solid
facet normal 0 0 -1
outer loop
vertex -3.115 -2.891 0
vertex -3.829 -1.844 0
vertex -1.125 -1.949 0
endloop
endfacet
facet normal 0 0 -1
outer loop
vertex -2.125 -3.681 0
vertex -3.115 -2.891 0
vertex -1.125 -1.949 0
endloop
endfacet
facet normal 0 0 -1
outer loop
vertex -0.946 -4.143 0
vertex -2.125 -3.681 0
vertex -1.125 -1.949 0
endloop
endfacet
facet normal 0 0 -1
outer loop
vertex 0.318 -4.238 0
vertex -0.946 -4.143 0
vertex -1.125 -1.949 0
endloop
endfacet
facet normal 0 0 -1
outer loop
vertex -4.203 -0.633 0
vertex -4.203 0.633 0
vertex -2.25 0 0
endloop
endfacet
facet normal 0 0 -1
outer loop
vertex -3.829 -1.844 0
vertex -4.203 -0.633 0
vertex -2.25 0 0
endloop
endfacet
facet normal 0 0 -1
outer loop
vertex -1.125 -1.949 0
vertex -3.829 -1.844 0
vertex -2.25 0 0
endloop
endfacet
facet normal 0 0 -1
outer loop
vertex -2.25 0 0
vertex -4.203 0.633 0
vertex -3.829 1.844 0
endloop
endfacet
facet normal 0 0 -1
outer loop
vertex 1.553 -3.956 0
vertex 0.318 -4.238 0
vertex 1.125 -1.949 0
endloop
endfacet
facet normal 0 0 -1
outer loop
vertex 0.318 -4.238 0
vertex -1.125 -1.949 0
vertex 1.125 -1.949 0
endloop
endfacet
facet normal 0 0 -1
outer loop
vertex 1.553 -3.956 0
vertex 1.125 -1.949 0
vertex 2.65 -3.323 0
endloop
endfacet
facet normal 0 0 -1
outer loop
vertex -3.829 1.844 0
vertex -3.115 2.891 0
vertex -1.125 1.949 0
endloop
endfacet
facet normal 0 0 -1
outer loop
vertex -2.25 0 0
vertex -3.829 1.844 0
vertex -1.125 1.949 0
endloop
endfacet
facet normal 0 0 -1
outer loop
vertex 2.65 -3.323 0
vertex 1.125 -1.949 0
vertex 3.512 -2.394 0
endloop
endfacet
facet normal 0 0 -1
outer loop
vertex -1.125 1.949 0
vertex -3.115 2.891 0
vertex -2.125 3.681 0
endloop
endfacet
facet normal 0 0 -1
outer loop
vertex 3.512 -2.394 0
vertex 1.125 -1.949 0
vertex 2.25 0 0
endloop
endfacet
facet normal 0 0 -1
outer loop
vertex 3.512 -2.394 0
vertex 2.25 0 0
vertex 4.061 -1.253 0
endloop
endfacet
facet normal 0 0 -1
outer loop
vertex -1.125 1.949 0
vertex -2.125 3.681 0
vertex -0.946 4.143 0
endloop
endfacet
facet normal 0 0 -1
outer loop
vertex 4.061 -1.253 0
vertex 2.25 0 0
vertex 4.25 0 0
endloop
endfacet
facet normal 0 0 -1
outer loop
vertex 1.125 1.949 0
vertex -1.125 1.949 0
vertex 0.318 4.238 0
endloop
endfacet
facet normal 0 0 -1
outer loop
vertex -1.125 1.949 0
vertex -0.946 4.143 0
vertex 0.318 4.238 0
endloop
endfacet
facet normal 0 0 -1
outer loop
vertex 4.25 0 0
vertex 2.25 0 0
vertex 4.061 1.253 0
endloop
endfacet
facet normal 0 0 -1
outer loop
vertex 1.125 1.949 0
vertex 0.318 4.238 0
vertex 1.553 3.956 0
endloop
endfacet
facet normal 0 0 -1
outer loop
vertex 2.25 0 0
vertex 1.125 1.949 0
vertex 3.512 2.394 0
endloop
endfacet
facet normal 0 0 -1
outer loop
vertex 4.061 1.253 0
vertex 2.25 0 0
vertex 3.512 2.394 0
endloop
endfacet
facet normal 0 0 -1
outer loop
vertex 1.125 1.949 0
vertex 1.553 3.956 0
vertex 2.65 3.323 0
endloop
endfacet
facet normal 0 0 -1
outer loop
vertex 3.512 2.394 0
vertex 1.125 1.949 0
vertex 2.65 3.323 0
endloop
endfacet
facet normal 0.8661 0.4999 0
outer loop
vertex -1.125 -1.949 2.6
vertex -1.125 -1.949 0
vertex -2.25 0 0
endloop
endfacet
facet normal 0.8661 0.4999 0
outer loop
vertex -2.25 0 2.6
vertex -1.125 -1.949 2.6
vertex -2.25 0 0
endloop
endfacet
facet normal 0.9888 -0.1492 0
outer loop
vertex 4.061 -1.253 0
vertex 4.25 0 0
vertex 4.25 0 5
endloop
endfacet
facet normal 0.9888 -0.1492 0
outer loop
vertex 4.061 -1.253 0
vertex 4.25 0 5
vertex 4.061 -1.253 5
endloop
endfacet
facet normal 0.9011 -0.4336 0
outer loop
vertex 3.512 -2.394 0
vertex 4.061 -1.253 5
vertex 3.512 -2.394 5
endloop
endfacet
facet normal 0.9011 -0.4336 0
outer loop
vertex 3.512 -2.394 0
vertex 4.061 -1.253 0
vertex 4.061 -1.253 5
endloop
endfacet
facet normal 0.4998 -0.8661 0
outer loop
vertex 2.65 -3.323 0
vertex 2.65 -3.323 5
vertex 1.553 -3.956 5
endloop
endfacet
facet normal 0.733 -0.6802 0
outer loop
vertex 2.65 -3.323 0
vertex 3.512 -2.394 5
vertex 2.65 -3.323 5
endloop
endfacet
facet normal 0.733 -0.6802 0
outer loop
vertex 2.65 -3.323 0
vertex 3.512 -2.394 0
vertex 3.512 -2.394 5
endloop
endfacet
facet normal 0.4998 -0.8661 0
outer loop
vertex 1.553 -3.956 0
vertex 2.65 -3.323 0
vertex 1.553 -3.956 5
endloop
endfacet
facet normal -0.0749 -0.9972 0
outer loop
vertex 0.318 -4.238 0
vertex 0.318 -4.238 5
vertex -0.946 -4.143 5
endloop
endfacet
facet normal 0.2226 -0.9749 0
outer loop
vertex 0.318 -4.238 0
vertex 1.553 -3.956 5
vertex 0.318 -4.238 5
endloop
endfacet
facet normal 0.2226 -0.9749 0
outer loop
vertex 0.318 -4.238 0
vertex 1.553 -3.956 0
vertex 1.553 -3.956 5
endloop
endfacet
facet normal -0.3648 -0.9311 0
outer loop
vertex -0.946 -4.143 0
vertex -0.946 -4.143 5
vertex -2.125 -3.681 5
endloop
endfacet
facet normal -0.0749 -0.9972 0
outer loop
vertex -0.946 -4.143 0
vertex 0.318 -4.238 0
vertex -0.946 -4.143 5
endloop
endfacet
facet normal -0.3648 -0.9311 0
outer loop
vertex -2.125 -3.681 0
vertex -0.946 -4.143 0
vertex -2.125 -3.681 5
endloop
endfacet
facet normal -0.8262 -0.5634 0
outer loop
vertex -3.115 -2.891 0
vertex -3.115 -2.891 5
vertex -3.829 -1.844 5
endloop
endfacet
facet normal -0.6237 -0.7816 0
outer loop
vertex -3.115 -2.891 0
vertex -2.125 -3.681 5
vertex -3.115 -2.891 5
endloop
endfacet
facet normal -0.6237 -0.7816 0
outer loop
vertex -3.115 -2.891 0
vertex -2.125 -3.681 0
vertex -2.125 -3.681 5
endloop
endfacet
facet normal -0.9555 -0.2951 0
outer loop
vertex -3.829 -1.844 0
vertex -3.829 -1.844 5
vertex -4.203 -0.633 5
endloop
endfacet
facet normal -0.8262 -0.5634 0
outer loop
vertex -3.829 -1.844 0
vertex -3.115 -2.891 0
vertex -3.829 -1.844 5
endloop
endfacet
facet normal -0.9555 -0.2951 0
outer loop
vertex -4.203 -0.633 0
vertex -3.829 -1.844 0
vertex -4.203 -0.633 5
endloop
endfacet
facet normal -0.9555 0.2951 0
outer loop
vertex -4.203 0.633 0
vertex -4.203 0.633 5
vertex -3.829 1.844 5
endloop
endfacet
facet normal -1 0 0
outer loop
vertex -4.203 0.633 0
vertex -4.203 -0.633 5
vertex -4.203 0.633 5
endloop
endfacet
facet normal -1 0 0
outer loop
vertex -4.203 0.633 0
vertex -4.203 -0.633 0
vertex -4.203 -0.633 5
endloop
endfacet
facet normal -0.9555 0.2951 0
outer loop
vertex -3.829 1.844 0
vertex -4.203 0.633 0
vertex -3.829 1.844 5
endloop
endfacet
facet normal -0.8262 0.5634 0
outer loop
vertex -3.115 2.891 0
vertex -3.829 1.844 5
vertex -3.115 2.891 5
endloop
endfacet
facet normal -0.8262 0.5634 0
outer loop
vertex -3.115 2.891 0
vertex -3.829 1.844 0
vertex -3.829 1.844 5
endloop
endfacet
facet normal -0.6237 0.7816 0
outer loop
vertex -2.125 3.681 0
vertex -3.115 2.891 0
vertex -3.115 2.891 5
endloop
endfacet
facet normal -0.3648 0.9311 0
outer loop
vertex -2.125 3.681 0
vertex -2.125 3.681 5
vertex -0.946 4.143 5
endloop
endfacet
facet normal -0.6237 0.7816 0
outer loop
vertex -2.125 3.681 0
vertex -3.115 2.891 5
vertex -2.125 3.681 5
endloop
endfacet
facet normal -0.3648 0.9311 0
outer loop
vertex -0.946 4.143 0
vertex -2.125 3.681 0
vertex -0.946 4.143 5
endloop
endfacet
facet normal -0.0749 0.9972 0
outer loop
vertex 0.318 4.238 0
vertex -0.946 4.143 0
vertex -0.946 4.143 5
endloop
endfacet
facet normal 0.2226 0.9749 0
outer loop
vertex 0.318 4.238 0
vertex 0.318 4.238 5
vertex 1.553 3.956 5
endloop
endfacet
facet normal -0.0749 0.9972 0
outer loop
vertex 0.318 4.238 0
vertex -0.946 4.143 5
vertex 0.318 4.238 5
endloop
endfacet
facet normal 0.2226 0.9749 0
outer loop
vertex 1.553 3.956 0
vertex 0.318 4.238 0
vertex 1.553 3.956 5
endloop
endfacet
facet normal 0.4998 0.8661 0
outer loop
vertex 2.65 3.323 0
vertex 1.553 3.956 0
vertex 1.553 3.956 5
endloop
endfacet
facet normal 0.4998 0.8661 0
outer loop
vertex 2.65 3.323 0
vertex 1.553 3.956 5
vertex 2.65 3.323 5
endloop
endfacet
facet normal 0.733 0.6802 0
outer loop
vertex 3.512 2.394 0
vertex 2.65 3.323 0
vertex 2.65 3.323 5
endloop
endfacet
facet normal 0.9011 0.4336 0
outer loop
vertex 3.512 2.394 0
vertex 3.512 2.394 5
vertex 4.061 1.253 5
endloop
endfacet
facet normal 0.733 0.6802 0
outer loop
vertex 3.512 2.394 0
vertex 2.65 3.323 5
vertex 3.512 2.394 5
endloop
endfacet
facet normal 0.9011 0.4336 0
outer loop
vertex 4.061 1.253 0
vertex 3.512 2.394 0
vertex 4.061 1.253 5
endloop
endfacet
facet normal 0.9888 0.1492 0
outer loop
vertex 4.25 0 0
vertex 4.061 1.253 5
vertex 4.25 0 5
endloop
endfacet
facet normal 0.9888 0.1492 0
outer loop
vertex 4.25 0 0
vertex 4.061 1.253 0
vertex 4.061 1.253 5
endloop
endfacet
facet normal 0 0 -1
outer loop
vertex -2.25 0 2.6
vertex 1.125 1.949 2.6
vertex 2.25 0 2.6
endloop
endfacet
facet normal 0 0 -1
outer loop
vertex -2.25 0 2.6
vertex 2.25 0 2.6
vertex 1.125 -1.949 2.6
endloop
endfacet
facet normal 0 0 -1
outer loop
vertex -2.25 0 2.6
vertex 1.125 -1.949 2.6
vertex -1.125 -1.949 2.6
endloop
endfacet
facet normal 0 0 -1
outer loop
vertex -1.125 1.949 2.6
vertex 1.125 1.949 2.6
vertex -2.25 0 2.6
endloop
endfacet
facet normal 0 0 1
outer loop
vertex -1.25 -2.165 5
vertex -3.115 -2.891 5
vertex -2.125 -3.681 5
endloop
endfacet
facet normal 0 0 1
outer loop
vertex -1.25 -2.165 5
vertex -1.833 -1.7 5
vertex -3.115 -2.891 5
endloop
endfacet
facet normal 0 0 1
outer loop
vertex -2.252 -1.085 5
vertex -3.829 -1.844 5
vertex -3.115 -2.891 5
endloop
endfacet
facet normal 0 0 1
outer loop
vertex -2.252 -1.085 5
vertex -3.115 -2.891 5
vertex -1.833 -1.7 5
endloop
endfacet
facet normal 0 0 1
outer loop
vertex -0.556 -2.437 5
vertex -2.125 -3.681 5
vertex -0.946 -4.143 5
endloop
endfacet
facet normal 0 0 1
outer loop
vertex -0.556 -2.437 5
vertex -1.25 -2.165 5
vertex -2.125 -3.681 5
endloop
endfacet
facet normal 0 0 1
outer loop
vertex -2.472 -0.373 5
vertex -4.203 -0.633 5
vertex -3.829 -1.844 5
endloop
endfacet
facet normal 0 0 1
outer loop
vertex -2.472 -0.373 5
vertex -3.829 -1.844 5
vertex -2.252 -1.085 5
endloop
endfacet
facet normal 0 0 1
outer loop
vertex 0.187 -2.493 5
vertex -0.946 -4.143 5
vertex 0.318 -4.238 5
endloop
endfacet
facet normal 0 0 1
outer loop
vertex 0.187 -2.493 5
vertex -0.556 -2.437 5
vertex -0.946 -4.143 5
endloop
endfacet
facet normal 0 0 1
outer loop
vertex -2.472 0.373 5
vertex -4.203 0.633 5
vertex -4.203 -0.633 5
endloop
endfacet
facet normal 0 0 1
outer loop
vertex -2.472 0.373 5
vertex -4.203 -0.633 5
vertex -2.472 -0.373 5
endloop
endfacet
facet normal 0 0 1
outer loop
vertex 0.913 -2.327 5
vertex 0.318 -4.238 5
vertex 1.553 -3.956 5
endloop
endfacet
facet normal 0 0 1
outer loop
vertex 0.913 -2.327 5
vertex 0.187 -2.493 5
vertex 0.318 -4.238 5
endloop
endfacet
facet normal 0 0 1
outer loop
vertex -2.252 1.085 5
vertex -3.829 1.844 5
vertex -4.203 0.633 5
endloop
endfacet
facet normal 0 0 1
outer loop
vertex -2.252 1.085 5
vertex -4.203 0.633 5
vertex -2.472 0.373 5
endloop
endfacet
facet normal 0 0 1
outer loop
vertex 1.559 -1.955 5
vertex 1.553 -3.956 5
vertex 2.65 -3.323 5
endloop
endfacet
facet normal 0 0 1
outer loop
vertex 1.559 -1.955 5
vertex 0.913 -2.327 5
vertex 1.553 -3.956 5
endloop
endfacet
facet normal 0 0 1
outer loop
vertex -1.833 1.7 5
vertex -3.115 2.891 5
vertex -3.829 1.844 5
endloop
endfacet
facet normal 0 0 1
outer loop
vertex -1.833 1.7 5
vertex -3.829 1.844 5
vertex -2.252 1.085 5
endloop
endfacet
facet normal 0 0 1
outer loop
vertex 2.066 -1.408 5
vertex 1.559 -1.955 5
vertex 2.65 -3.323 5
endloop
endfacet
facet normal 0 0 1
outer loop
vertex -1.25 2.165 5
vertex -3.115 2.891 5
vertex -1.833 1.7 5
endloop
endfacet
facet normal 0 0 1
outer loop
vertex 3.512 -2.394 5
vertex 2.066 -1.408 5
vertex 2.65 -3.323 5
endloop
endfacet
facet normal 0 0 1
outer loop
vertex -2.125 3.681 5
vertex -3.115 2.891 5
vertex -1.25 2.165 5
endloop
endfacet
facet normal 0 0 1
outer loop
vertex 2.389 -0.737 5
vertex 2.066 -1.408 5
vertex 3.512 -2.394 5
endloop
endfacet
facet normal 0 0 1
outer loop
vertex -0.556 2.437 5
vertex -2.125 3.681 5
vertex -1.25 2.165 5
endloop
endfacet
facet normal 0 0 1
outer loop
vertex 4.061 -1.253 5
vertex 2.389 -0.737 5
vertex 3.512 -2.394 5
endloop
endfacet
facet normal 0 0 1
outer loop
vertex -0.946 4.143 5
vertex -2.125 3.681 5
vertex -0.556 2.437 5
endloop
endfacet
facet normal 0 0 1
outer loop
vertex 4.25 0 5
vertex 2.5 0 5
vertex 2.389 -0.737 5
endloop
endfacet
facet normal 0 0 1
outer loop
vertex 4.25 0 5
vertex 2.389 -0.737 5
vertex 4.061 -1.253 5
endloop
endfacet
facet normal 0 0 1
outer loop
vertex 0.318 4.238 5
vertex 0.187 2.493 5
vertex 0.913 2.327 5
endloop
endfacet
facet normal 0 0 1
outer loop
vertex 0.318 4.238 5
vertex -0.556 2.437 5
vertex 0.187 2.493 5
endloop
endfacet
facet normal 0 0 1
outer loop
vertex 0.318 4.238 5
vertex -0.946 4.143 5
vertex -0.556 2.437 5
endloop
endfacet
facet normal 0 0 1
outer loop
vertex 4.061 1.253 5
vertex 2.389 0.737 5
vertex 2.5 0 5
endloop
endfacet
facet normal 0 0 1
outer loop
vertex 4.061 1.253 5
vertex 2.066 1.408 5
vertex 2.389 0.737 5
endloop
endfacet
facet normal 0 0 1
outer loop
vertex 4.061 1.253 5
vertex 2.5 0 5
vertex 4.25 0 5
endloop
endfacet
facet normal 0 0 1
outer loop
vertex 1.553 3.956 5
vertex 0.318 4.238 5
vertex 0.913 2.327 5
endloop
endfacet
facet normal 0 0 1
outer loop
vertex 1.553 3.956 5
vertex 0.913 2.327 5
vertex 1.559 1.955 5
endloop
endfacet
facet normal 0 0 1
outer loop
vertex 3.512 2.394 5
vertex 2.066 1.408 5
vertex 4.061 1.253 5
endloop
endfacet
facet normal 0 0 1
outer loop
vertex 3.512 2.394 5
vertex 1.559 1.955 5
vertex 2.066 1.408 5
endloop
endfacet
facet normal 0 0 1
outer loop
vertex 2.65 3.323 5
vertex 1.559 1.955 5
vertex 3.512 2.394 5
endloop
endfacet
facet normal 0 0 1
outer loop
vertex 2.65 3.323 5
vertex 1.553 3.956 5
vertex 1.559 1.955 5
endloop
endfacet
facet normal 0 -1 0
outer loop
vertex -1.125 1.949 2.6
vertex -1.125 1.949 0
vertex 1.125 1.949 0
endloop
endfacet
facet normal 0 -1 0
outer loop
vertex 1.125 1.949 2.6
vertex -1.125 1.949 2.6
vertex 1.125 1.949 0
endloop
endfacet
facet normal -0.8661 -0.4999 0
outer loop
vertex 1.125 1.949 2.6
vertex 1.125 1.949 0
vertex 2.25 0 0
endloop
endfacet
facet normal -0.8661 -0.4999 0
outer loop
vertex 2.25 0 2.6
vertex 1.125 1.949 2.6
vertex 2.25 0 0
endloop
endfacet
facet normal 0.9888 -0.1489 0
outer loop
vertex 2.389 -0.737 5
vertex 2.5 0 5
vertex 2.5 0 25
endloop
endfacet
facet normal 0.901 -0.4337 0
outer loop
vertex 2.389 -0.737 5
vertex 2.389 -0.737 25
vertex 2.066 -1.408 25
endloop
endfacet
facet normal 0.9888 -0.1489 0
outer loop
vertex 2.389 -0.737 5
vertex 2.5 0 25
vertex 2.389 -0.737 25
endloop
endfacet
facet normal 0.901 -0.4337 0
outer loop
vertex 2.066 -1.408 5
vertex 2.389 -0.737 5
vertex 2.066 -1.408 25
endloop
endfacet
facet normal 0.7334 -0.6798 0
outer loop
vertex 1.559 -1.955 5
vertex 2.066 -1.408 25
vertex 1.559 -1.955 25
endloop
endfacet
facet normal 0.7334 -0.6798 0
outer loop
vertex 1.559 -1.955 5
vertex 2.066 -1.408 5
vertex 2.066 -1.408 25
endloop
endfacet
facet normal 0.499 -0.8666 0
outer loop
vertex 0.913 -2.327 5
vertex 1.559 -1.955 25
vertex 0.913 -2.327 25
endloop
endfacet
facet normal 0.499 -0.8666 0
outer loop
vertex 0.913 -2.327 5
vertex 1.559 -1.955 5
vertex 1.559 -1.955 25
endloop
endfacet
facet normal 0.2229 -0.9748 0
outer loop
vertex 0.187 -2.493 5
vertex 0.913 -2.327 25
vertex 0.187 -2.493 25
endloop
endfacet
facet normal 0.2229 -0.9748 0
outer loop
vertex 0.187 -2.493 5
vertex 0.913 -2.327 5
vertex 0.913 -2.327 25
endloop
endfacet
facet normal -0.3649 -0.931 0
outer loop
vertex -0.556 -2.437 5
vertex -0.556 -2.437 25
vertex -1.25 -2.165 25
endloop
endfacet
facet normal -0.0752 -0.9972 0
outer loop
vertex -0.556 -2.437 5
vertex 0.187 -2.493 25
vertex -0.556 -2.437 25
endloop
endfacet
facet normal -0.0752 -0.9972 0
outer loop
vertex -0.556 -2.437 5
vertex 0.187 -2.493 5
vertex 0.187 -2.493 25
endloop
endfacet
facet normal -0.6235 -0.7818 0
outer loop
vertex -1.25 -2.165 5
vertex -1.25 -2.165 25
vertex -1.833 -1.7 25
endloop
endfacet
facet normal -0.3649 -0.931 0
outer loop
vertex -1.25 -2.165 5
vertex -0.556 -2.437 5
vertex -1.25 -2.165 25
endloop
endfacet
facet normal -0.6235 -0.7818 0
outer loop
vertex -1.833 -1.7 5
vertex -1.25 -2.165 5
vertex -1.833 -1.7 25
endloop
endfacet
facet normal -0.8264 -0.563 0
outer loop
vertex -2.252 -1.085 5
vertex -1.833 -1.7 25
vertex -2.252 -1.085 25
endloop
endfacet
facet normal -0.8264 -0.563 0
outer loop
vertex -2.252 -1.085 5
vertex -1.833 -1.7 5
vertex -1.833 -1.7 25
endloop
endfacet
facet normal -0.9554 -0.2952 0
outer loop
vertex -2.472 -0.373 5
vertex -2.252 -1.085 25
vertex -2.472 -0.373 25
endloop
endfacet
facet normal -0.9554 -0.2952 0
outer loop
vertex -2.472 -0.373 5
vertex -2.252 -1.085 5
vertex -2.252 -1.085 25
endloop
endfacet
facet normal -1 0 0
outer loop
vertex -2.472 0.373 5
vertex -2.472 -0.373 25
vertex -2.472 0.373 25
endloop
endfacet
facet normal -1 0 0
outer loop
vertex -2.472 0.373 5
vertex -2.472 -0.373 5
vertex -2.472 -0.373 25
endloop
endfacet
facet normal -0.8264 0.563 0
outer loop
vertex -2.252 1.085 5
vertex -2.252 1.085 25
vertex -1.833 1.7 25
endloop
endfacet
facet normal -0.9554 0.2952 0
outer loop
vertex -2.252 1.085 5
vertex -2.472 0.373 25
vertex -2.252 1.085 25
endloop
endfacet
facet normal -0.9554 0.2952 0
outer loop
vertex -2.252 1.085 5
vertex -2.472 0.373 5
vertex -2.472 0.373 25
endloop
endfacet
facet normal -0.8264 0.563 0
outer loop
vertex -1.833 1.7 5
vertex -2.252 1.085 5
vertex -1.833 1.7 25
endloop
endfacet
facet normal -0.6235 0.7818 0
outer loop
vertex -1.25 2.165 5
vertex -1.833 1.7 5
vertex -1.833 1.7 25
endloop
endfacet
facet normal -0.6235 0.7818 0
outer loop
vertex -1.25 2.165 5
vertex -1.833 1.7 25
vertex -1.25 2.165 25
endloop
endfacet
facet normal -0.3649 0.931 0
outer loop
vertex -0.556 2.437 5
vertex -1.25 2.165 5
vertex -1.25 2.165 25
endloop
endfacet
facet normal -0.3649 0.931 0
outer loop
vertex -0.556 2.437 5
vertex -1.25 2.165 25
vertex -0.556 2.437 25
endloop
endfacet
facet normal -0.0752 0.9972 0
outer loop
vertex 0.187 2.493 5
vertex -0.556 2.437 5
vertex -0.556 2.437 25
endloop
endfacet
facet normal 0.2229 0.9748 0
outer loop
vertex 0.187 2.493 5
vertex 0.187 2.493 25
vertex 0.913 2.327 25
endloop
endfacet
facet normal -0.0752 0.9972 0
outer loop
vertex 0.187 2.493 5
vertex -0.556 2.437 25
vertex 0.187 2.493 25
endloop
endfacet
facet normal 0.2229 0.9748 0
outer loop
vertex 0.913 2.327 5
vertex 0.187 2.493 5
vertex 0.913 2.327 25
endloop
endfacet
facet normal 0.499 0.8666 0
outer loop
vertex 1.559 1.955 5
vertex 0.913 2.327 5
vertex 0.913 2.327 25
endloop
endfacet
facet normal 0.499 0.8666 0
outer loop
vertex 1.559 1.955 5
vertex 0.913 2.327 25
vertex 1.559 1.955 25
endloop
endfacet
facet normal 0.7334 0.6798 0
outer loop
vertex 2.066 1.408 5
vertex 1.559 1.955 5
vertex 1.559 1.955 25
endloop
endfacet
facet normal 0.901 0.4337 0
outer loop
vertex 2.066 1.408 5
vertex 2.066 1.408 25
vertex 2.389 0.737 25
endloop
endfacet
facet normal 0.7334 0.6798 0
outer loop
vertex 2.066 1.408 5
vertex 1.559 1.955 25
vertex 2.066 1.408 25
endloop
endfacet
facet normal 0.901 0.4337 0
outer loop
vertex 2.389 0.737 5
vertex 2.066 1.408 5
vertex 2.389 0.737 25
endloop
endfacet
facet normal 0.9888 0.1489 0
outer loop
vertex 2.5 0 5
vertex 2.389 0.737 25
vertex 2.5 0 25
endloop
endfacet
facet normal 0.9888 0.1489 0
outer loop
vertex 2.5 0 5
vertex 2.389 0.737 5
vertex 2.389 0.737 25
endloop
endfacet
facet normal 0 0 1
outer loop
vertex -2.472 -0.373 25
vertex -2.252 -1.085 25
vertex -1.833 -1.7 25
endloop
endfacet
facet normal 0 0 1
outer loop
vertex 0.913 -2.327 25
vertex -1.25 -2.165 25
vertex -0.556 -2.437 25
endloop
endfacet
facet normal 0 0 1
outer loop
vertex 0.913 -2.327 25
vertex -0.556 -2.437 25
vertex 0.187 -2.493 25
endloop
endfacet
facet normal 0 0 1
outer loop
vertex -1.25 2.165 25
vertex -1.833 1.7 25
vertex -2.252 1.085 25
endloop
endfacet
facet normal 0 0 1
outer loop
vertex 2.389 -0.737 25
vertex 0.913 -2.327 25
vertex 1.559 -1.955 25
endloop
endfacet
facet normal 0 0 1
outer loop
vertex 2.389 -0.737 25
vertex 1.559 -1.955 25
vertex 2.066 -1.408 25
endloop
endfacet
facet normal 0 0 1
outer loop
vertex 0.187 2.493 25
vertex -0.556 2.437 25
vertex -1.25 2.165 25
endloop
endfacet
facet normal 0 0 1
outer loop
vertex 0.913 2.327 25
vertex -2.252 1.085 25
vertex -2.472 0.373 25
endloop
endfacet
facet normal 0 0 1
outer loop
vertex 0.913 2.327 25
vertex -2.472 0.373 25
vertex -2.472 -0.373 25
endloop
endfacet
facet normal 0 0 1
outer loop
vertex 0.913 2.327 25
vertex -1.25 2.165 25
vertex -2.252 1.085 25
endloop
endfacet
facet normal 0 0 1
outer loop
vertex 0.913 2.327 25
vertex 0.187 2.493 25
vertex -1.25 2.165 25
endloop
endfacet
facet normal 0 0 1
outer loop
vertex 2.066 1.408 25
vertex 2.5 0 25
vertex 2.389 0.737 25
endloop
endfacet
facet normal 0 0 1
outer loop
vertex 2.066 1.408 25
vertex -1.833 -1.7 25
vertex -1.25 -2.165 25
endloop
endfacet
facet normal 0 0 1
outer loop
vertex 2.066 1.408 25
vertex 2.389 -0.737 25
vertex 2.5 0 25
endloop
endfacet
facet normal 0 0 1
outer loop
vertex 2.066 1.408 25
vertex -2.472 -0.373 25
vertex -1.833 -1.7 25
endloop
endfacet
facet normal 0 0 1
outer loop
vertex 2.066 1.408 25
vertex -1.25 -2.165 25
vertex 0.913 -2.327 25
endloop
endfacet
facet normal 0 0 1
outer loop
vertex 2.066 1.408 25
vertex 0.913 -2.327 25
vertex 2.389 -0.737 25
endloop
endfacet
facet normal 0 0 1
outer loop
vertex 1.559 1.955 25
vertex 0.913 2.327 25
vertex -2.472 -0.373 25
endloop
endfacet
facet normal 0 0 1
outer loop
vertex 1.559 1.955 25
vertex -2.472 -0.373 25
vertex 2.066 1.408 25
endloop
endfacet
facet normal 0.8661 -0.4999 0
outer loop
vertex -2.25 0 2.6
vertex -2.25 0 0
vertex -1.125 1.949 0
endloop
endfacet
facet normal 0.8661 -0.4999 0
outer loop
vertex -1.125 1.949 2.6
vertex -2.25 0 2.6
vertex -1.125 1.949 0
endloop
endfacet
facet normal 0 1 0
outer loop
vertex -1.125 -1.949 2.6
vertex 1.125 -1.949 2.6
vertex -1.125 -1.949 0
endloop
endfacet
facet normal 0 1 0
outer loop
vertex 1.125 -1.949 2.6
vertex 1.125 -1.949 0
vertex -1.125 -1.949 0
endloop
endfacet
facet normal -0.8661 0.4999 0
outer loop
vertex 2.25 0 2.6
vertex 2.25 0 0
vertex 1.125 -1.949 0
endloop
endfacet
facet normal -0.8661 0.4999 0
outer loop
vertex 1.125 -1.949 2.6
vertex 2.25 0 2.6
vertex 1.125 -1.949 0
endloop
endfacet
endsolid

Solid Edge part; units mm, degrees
sketch "Sketch1" plane through (0, 0, 0) normal (0, 0, 1) x (1, 0, 0)
  circle A0 centre (0, 0) radius 4.25
  dimension "D1" = 8.5
extrude "Protrusion1" add sketch "Sketch1" along normal blind 5
sketch "Sketch2" plane through (0, 0, 5) normal (0, 0, 1) x (1, 0, 0)
  circle A0 centre (0, 0) radius 2.5
extrude "ExtrudedProtrusion_2" add sketch "Sketch2" along normal blind 20
sketch "Sketch3" plane through (0, 0, 0) normal (0, 0, -1) x (-1, 0, 0)
  line L0 (2.25, 0) -> (1.125, 1.9486)
  line L1 (1.125, 1.9486) -> (-1.125, 1.9486)
  line L2 (-1.125, 1.9486) -> (-2.25, 0)
  line L3 (-2.25, 0) -> (-1.125, -1.9486)
  line L4 (-1.125, -1.9486) -> (1.125, -1.9486)
  line L5 (1.125, -1.9486) -> (2.25, 0)
extrude "ExtrudedCutout_1" cut sketch "Sketch3" against normal blind 2.6
properties material "Stainless steel"
